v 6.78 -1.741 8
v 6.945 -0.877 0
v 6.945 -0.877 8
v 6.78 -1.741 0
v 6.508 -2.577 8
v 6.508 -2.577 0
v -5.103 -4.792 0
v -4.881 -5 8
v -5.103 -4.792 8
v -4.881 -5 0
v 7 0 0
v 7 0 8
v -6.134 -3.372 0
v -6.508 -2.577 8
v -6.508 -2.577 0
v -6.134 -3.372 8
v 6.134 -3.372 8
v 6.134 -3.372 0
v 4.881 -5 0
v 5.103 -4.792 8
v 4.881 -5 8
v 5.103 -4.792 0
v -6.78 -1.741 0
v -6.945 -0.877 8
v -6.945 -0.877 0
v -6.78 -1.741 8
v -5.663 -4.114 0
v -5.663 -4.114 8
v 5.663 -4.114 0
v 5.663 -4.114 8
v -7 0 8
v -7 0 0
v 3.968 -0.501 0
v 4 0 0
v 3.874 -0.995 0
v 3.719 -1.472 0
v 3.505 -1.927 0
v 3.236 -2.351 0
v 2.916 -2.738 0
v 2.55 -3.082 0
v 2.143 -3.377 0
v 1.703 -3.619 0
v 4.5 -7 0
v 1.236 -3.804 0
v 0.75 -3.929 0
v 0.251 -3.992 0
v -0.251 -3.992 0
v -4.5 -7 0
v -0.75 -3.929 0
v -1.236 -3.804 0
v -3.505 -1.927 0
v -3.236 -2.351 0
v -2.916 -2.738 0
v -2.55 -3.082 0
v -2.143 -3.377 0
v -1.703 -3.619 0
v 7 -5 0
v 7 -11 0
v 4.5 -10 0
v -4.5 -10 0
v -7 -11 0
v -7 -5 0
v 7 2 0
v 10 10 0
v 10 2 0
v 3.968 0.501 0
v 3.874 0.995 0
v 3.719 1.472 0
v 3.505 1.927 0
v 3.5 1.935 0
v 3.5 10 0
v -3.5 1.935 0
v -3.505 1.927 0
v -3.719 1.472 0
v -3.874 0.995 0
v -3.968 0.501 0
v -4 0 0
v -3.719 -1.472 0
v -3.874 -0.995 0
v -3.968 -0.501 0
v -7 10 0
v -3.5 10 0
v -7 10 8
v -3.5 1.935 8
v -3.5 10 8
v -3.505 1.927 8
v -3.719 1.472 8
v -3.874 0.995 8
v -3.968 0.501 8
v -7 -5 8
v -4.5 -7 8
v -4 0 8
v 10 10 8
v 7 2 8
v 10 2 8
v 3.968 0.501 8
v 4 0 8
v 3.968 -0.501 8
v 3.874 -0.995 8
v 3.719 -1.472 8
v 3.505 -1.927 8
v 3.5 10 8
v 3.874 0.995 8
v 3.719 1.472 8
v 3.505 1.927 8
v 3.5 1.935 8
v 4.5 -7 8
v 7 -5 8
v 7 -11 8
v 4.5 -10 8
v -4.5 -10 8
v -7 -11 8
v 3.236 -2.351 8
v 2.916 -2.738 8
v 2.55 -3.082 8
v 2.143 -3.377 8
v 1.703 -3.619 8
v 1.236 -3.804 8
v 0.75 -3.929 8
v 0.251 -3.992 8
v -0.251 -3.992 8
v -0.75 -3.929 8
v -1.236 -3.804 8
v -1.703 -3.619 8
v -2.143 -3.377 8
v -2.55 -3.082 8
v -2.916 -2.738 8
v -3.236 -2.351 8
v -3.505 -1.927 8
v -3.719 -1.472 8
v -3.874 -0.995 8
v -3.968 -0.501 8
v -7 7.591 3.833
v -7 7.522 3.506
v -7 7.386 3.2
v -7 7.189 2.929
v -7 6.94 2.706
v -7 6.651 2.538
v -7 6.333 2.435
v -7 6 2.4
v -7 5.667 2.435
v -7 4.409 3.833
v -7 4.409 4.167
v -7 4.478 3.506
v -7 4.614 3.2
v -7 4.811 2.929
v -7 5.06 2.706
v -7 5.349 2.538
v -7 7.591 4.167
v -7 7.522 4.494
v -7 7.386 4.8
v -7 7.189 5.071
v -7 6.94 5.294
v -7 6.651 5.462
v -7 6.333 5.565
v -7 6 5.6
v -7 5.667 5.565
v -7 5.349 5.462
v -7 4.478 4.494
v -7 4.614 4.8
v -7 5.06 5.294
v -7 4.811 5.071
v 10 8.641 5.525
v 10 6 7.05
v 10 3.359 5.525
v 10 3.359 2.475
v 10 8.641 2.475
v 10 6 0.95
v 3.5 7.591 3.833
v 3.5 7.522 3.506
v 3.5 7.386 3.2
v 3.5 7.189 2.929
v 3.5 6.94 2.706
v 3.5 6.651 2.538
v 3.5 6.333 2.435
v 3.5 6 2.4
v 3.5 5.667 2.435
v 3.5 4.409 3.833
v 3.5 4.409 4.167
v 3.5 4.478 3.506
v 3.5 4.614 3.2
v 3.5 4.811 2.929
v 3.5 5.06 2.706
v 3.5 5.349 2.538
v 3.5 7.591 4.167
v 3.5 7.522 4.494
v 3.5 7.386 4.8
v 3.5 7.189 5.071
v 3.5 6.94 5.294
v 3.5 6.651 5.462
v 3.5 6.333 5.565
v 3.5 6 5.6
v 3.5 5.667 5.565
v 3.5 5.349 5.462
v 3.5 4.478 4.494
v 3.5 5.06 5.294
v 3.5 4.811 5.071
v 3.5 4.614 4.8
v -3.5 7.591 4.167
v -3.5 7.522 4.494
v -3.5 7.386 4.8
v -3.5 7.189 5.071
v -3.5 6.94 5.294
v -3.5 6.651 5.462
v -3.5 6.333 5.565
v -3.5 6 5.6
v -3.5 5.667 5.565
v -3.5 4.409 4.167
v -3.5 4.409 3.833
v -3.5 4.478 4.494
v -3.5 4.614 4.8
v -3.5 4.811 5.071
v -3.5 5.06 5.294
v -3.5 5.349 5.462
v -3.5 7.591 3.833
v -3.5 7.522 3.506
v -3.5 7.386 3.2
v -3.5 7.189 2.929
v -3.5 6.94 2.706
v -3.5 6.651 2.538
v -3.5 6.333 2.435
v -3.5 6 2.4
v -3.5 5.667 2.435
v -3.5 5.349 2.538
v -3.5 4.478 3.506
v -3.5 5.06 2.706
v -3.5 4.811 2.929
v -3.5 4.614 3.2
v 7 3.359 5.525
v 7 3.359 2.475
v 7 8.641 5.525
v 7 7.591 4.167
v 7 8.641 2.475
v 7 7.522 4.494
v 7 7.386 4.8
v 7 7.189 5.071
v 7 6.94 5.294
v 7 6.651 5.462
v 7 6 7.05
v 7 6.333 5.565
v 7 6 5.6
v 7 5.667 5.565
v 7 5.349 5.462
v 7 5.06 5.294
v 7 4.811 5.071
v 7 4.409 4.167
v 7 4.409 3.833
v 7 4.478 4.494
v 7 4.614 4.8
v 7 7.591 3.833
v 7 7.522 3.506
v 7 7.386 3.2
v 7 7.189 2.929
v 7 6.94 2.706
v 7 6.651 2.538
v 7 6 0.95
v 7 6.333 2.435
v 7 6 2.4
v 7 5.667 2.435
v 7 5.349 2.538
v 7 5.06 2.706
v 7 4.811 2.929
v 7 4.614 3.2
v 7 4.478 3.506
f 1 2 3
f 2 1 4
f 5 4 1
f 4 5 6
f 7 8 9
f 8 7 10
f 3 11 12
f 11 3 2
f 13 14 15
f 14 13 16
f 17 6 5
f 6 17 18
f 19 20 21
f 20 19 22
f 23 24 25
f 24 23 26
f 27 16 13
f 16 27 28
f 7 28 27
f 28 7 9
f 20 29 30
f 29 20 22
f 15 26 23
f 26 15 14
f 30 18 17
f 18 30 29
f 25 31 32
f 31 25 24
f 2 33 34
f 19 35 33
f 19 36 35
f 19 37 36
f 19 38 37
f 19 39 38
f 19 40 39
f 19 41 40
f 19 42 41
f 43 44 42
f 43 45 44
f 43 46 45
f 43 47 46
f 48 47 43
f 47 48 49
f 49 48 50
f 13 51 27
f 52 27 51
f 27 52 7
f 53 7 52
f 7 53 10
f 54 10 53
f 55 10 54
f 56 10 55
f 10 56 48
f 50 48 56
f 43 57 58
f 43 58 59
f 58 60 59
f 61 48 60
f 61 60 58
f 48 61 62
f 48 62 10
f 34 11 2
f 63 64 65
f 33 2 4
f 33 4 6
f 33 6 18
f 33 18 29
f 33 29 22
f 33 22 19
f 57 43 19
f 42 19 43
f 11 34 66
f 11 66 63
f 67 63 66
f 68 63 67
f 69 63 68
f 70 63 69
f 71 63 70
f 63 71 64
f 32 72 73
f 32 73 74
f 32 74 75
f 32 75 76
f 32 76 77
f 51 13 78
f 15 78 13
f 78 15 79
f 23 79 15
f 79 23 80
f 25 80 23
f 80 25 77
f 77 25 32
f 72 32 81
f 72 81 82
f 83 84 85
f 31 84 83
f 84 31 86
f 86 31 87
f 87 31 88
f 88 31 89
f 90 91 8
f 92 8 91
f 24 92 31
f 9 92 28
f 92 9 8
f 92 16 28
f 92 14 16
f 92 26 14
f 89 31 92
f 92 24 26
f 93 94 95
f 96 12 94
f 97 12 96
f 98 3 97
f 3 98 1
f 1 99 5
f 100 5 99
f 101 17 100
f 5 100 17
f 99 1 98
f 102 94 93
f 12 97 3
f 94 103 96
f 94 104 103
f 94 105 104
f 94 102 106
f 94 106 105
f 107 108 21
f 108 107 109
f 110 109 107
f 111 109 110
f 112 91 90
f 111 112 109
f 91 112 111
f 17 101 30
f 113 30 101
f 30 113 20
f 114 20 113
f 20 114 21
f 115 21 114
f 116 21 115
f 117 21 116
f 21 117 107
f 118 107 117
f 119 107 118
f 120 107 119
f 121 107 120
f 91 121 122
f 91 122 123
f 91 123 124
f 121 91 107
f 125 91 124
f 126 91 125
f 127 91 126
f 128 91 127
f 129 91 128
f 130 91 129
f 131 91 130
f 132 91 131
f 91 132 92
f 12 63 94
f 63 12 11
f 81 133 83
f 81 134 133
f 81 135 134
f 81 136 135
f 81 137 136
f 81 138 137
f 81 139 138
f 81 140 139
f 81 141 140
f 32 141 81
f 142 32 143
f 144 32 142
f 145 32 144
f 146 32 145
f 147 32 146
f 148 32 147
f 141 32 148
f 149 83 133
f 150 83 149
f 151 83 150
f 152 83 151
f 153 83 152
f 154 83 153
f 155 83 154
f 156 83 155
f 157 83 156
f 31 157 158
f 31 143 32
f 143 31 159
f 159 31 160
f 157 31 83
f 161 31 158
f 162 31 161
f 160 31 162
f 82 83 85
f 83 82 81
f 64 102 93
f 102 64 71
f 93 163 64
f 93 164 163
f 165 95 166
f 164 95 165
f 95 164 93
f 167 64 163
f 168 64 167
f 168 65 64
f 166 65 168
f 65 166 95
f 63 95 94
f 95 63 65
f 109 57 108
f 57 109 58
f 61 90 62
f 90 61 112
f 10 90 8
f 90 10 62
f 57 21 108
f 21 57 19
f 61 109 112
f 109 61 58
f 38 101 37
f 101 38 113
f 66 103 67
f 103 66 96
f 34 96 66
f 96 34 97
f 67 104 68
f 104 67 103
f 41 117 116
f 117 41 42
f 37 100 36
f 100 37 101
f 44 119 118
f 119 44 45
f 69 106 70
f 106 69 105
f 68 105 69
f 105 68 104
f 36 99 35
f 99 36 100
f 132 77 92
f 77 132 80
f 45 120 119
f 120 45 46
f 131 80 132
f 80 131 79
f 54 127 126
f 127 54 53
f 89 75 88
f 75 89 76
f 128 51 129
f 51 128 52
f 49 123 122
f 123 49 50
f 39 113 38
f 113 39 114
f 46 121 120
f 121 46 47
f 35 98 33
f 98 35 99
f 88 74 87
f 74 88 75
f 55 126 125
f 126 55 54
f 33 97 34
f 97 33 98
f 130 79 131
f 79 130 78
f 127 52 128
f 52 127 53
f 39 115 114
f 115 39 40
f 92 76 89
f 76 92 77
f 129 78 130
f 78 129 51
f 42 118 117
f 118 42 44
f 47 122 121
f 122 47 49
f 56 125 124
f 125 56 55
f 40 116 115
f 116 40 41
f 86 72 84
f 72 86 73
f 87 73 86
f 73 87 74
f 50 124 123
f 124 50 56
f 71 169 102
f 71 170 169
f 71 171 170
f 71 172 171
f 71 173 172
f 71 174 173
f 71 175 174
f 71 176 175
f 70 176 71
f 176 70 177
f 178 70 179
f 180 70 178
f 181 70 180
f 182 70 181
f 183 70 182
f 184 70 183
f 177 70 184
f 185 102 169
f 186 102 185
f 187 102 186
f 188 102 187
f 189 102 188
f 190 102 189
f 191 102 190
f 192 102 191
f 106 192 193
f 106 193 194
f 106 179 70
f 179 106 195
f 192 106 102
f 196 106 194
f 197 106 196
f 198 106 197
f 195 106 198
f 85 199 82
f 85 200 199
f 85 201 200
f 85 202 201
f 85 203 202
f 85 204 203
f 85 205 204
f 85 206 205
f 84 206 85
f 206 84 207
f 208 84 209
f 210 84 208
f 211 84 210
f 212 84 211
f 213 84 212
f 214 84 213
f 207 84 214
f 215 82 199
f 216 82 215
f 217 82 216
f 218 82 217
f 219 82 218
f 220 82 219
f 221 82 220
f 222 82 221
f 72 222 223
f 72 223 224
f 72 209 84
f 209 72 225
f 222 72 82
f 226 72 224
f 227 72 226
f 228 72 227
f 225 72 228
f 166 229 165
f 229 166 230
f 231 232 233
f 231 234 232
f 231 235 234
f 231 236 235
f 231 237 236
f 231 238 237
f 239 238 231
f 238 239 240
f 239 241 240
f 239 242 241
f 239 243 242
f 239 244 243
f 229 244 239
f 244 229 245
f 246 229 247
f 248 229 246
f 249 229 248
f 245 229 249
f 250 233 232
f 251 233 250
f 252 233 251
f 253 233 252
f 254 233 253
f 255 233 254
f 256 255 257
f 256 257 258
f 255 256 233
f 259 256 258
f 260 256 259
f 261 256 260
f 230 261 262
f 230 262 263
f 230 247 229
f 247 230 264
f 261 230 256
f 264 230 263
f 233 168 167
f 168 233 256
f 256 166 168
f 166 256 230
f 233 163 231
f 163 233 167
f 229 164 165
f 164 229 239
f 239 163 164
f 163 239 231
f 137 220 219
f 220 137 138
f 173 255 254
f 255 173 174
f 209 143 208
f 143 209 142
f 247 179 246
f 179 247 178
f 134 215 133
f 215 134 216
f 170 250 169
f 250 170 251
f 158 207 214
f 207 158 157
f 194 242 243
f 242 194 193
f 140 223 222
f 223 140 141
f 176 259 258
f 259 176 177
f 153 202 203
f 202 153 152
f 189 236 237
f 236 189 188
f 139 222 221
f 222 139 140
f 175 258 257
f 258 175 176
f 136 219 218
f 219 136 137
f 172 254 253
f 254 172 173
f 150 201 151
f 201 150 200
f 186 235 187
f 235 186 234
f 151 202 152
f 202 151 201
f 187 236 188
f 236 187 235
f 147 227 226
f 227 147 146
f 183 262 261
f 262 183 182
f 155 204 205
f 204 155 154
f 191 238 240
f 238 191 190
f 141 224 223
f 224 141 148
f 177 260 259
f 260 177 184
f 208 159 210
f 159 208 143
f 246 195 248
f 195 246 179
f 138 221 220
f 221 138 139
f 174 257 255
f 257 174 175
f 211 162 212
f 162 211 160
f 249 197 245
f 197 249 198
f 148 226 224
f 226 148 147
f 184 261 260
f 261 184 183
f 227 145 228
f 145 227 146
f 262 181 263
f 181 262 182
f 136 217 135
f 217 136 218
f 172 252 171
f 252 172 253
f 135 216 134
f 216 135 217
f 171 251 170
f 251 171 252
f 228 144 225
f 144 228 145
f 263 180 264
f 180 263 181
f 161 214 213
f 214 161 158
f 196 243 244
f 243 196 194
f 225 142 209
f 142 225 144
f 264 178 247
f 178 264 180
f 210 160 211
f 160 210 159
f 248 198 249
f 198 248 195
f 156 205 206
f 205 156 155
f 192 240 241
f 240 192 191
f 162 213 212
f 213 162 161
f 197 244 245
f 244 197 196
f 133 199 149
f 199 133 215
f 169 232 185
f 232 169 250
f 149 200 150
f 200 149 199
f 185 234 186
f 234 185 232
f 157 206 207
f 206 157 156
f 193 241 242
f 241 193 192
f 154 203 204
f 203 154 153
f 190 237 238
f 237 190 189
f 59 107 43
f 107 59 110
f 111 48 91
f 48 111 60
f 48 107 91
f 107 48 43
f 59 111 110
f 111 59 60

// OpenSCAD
rod=8;
thick=3;
height=8;

module base(){
        
    cylinder(r=rod/2+thick,h=height,$fn=50);
    translate([-(rod+2*thick)/2,0])cube([rod+2*thick,rod/2+2+4,height]);
    translate([(rod+2*thick)/2,rod/2+2-4])cube([3,8,height]);
    translate([-(rod+2*thick)/2,-(rod/2+thick+4)])cube([rod+2*thick,6,height]);
}


module holes(){
    cylinder(r=rod/2,h=height,$fn=50);
    translate([-(rod-1)/2,0])cube([rod-1,rod+8,height]);
    //nut and screw hole
    translate([(rod+2*thick)/2,rod/2+2,height/2])#rotate([0,90])cylinder(r=6.1/2,h=3,$fn=6);
    translate([-rod,rod/2+2 ,height/2])rotate([0,90])cylinder(r=3.2/2,h=2*rod,$fn=30);
    translate([-9/2,-(rod/2+thick+3)])cube([9,3,height]);
}

difference(){
    base();
    holes();
}
